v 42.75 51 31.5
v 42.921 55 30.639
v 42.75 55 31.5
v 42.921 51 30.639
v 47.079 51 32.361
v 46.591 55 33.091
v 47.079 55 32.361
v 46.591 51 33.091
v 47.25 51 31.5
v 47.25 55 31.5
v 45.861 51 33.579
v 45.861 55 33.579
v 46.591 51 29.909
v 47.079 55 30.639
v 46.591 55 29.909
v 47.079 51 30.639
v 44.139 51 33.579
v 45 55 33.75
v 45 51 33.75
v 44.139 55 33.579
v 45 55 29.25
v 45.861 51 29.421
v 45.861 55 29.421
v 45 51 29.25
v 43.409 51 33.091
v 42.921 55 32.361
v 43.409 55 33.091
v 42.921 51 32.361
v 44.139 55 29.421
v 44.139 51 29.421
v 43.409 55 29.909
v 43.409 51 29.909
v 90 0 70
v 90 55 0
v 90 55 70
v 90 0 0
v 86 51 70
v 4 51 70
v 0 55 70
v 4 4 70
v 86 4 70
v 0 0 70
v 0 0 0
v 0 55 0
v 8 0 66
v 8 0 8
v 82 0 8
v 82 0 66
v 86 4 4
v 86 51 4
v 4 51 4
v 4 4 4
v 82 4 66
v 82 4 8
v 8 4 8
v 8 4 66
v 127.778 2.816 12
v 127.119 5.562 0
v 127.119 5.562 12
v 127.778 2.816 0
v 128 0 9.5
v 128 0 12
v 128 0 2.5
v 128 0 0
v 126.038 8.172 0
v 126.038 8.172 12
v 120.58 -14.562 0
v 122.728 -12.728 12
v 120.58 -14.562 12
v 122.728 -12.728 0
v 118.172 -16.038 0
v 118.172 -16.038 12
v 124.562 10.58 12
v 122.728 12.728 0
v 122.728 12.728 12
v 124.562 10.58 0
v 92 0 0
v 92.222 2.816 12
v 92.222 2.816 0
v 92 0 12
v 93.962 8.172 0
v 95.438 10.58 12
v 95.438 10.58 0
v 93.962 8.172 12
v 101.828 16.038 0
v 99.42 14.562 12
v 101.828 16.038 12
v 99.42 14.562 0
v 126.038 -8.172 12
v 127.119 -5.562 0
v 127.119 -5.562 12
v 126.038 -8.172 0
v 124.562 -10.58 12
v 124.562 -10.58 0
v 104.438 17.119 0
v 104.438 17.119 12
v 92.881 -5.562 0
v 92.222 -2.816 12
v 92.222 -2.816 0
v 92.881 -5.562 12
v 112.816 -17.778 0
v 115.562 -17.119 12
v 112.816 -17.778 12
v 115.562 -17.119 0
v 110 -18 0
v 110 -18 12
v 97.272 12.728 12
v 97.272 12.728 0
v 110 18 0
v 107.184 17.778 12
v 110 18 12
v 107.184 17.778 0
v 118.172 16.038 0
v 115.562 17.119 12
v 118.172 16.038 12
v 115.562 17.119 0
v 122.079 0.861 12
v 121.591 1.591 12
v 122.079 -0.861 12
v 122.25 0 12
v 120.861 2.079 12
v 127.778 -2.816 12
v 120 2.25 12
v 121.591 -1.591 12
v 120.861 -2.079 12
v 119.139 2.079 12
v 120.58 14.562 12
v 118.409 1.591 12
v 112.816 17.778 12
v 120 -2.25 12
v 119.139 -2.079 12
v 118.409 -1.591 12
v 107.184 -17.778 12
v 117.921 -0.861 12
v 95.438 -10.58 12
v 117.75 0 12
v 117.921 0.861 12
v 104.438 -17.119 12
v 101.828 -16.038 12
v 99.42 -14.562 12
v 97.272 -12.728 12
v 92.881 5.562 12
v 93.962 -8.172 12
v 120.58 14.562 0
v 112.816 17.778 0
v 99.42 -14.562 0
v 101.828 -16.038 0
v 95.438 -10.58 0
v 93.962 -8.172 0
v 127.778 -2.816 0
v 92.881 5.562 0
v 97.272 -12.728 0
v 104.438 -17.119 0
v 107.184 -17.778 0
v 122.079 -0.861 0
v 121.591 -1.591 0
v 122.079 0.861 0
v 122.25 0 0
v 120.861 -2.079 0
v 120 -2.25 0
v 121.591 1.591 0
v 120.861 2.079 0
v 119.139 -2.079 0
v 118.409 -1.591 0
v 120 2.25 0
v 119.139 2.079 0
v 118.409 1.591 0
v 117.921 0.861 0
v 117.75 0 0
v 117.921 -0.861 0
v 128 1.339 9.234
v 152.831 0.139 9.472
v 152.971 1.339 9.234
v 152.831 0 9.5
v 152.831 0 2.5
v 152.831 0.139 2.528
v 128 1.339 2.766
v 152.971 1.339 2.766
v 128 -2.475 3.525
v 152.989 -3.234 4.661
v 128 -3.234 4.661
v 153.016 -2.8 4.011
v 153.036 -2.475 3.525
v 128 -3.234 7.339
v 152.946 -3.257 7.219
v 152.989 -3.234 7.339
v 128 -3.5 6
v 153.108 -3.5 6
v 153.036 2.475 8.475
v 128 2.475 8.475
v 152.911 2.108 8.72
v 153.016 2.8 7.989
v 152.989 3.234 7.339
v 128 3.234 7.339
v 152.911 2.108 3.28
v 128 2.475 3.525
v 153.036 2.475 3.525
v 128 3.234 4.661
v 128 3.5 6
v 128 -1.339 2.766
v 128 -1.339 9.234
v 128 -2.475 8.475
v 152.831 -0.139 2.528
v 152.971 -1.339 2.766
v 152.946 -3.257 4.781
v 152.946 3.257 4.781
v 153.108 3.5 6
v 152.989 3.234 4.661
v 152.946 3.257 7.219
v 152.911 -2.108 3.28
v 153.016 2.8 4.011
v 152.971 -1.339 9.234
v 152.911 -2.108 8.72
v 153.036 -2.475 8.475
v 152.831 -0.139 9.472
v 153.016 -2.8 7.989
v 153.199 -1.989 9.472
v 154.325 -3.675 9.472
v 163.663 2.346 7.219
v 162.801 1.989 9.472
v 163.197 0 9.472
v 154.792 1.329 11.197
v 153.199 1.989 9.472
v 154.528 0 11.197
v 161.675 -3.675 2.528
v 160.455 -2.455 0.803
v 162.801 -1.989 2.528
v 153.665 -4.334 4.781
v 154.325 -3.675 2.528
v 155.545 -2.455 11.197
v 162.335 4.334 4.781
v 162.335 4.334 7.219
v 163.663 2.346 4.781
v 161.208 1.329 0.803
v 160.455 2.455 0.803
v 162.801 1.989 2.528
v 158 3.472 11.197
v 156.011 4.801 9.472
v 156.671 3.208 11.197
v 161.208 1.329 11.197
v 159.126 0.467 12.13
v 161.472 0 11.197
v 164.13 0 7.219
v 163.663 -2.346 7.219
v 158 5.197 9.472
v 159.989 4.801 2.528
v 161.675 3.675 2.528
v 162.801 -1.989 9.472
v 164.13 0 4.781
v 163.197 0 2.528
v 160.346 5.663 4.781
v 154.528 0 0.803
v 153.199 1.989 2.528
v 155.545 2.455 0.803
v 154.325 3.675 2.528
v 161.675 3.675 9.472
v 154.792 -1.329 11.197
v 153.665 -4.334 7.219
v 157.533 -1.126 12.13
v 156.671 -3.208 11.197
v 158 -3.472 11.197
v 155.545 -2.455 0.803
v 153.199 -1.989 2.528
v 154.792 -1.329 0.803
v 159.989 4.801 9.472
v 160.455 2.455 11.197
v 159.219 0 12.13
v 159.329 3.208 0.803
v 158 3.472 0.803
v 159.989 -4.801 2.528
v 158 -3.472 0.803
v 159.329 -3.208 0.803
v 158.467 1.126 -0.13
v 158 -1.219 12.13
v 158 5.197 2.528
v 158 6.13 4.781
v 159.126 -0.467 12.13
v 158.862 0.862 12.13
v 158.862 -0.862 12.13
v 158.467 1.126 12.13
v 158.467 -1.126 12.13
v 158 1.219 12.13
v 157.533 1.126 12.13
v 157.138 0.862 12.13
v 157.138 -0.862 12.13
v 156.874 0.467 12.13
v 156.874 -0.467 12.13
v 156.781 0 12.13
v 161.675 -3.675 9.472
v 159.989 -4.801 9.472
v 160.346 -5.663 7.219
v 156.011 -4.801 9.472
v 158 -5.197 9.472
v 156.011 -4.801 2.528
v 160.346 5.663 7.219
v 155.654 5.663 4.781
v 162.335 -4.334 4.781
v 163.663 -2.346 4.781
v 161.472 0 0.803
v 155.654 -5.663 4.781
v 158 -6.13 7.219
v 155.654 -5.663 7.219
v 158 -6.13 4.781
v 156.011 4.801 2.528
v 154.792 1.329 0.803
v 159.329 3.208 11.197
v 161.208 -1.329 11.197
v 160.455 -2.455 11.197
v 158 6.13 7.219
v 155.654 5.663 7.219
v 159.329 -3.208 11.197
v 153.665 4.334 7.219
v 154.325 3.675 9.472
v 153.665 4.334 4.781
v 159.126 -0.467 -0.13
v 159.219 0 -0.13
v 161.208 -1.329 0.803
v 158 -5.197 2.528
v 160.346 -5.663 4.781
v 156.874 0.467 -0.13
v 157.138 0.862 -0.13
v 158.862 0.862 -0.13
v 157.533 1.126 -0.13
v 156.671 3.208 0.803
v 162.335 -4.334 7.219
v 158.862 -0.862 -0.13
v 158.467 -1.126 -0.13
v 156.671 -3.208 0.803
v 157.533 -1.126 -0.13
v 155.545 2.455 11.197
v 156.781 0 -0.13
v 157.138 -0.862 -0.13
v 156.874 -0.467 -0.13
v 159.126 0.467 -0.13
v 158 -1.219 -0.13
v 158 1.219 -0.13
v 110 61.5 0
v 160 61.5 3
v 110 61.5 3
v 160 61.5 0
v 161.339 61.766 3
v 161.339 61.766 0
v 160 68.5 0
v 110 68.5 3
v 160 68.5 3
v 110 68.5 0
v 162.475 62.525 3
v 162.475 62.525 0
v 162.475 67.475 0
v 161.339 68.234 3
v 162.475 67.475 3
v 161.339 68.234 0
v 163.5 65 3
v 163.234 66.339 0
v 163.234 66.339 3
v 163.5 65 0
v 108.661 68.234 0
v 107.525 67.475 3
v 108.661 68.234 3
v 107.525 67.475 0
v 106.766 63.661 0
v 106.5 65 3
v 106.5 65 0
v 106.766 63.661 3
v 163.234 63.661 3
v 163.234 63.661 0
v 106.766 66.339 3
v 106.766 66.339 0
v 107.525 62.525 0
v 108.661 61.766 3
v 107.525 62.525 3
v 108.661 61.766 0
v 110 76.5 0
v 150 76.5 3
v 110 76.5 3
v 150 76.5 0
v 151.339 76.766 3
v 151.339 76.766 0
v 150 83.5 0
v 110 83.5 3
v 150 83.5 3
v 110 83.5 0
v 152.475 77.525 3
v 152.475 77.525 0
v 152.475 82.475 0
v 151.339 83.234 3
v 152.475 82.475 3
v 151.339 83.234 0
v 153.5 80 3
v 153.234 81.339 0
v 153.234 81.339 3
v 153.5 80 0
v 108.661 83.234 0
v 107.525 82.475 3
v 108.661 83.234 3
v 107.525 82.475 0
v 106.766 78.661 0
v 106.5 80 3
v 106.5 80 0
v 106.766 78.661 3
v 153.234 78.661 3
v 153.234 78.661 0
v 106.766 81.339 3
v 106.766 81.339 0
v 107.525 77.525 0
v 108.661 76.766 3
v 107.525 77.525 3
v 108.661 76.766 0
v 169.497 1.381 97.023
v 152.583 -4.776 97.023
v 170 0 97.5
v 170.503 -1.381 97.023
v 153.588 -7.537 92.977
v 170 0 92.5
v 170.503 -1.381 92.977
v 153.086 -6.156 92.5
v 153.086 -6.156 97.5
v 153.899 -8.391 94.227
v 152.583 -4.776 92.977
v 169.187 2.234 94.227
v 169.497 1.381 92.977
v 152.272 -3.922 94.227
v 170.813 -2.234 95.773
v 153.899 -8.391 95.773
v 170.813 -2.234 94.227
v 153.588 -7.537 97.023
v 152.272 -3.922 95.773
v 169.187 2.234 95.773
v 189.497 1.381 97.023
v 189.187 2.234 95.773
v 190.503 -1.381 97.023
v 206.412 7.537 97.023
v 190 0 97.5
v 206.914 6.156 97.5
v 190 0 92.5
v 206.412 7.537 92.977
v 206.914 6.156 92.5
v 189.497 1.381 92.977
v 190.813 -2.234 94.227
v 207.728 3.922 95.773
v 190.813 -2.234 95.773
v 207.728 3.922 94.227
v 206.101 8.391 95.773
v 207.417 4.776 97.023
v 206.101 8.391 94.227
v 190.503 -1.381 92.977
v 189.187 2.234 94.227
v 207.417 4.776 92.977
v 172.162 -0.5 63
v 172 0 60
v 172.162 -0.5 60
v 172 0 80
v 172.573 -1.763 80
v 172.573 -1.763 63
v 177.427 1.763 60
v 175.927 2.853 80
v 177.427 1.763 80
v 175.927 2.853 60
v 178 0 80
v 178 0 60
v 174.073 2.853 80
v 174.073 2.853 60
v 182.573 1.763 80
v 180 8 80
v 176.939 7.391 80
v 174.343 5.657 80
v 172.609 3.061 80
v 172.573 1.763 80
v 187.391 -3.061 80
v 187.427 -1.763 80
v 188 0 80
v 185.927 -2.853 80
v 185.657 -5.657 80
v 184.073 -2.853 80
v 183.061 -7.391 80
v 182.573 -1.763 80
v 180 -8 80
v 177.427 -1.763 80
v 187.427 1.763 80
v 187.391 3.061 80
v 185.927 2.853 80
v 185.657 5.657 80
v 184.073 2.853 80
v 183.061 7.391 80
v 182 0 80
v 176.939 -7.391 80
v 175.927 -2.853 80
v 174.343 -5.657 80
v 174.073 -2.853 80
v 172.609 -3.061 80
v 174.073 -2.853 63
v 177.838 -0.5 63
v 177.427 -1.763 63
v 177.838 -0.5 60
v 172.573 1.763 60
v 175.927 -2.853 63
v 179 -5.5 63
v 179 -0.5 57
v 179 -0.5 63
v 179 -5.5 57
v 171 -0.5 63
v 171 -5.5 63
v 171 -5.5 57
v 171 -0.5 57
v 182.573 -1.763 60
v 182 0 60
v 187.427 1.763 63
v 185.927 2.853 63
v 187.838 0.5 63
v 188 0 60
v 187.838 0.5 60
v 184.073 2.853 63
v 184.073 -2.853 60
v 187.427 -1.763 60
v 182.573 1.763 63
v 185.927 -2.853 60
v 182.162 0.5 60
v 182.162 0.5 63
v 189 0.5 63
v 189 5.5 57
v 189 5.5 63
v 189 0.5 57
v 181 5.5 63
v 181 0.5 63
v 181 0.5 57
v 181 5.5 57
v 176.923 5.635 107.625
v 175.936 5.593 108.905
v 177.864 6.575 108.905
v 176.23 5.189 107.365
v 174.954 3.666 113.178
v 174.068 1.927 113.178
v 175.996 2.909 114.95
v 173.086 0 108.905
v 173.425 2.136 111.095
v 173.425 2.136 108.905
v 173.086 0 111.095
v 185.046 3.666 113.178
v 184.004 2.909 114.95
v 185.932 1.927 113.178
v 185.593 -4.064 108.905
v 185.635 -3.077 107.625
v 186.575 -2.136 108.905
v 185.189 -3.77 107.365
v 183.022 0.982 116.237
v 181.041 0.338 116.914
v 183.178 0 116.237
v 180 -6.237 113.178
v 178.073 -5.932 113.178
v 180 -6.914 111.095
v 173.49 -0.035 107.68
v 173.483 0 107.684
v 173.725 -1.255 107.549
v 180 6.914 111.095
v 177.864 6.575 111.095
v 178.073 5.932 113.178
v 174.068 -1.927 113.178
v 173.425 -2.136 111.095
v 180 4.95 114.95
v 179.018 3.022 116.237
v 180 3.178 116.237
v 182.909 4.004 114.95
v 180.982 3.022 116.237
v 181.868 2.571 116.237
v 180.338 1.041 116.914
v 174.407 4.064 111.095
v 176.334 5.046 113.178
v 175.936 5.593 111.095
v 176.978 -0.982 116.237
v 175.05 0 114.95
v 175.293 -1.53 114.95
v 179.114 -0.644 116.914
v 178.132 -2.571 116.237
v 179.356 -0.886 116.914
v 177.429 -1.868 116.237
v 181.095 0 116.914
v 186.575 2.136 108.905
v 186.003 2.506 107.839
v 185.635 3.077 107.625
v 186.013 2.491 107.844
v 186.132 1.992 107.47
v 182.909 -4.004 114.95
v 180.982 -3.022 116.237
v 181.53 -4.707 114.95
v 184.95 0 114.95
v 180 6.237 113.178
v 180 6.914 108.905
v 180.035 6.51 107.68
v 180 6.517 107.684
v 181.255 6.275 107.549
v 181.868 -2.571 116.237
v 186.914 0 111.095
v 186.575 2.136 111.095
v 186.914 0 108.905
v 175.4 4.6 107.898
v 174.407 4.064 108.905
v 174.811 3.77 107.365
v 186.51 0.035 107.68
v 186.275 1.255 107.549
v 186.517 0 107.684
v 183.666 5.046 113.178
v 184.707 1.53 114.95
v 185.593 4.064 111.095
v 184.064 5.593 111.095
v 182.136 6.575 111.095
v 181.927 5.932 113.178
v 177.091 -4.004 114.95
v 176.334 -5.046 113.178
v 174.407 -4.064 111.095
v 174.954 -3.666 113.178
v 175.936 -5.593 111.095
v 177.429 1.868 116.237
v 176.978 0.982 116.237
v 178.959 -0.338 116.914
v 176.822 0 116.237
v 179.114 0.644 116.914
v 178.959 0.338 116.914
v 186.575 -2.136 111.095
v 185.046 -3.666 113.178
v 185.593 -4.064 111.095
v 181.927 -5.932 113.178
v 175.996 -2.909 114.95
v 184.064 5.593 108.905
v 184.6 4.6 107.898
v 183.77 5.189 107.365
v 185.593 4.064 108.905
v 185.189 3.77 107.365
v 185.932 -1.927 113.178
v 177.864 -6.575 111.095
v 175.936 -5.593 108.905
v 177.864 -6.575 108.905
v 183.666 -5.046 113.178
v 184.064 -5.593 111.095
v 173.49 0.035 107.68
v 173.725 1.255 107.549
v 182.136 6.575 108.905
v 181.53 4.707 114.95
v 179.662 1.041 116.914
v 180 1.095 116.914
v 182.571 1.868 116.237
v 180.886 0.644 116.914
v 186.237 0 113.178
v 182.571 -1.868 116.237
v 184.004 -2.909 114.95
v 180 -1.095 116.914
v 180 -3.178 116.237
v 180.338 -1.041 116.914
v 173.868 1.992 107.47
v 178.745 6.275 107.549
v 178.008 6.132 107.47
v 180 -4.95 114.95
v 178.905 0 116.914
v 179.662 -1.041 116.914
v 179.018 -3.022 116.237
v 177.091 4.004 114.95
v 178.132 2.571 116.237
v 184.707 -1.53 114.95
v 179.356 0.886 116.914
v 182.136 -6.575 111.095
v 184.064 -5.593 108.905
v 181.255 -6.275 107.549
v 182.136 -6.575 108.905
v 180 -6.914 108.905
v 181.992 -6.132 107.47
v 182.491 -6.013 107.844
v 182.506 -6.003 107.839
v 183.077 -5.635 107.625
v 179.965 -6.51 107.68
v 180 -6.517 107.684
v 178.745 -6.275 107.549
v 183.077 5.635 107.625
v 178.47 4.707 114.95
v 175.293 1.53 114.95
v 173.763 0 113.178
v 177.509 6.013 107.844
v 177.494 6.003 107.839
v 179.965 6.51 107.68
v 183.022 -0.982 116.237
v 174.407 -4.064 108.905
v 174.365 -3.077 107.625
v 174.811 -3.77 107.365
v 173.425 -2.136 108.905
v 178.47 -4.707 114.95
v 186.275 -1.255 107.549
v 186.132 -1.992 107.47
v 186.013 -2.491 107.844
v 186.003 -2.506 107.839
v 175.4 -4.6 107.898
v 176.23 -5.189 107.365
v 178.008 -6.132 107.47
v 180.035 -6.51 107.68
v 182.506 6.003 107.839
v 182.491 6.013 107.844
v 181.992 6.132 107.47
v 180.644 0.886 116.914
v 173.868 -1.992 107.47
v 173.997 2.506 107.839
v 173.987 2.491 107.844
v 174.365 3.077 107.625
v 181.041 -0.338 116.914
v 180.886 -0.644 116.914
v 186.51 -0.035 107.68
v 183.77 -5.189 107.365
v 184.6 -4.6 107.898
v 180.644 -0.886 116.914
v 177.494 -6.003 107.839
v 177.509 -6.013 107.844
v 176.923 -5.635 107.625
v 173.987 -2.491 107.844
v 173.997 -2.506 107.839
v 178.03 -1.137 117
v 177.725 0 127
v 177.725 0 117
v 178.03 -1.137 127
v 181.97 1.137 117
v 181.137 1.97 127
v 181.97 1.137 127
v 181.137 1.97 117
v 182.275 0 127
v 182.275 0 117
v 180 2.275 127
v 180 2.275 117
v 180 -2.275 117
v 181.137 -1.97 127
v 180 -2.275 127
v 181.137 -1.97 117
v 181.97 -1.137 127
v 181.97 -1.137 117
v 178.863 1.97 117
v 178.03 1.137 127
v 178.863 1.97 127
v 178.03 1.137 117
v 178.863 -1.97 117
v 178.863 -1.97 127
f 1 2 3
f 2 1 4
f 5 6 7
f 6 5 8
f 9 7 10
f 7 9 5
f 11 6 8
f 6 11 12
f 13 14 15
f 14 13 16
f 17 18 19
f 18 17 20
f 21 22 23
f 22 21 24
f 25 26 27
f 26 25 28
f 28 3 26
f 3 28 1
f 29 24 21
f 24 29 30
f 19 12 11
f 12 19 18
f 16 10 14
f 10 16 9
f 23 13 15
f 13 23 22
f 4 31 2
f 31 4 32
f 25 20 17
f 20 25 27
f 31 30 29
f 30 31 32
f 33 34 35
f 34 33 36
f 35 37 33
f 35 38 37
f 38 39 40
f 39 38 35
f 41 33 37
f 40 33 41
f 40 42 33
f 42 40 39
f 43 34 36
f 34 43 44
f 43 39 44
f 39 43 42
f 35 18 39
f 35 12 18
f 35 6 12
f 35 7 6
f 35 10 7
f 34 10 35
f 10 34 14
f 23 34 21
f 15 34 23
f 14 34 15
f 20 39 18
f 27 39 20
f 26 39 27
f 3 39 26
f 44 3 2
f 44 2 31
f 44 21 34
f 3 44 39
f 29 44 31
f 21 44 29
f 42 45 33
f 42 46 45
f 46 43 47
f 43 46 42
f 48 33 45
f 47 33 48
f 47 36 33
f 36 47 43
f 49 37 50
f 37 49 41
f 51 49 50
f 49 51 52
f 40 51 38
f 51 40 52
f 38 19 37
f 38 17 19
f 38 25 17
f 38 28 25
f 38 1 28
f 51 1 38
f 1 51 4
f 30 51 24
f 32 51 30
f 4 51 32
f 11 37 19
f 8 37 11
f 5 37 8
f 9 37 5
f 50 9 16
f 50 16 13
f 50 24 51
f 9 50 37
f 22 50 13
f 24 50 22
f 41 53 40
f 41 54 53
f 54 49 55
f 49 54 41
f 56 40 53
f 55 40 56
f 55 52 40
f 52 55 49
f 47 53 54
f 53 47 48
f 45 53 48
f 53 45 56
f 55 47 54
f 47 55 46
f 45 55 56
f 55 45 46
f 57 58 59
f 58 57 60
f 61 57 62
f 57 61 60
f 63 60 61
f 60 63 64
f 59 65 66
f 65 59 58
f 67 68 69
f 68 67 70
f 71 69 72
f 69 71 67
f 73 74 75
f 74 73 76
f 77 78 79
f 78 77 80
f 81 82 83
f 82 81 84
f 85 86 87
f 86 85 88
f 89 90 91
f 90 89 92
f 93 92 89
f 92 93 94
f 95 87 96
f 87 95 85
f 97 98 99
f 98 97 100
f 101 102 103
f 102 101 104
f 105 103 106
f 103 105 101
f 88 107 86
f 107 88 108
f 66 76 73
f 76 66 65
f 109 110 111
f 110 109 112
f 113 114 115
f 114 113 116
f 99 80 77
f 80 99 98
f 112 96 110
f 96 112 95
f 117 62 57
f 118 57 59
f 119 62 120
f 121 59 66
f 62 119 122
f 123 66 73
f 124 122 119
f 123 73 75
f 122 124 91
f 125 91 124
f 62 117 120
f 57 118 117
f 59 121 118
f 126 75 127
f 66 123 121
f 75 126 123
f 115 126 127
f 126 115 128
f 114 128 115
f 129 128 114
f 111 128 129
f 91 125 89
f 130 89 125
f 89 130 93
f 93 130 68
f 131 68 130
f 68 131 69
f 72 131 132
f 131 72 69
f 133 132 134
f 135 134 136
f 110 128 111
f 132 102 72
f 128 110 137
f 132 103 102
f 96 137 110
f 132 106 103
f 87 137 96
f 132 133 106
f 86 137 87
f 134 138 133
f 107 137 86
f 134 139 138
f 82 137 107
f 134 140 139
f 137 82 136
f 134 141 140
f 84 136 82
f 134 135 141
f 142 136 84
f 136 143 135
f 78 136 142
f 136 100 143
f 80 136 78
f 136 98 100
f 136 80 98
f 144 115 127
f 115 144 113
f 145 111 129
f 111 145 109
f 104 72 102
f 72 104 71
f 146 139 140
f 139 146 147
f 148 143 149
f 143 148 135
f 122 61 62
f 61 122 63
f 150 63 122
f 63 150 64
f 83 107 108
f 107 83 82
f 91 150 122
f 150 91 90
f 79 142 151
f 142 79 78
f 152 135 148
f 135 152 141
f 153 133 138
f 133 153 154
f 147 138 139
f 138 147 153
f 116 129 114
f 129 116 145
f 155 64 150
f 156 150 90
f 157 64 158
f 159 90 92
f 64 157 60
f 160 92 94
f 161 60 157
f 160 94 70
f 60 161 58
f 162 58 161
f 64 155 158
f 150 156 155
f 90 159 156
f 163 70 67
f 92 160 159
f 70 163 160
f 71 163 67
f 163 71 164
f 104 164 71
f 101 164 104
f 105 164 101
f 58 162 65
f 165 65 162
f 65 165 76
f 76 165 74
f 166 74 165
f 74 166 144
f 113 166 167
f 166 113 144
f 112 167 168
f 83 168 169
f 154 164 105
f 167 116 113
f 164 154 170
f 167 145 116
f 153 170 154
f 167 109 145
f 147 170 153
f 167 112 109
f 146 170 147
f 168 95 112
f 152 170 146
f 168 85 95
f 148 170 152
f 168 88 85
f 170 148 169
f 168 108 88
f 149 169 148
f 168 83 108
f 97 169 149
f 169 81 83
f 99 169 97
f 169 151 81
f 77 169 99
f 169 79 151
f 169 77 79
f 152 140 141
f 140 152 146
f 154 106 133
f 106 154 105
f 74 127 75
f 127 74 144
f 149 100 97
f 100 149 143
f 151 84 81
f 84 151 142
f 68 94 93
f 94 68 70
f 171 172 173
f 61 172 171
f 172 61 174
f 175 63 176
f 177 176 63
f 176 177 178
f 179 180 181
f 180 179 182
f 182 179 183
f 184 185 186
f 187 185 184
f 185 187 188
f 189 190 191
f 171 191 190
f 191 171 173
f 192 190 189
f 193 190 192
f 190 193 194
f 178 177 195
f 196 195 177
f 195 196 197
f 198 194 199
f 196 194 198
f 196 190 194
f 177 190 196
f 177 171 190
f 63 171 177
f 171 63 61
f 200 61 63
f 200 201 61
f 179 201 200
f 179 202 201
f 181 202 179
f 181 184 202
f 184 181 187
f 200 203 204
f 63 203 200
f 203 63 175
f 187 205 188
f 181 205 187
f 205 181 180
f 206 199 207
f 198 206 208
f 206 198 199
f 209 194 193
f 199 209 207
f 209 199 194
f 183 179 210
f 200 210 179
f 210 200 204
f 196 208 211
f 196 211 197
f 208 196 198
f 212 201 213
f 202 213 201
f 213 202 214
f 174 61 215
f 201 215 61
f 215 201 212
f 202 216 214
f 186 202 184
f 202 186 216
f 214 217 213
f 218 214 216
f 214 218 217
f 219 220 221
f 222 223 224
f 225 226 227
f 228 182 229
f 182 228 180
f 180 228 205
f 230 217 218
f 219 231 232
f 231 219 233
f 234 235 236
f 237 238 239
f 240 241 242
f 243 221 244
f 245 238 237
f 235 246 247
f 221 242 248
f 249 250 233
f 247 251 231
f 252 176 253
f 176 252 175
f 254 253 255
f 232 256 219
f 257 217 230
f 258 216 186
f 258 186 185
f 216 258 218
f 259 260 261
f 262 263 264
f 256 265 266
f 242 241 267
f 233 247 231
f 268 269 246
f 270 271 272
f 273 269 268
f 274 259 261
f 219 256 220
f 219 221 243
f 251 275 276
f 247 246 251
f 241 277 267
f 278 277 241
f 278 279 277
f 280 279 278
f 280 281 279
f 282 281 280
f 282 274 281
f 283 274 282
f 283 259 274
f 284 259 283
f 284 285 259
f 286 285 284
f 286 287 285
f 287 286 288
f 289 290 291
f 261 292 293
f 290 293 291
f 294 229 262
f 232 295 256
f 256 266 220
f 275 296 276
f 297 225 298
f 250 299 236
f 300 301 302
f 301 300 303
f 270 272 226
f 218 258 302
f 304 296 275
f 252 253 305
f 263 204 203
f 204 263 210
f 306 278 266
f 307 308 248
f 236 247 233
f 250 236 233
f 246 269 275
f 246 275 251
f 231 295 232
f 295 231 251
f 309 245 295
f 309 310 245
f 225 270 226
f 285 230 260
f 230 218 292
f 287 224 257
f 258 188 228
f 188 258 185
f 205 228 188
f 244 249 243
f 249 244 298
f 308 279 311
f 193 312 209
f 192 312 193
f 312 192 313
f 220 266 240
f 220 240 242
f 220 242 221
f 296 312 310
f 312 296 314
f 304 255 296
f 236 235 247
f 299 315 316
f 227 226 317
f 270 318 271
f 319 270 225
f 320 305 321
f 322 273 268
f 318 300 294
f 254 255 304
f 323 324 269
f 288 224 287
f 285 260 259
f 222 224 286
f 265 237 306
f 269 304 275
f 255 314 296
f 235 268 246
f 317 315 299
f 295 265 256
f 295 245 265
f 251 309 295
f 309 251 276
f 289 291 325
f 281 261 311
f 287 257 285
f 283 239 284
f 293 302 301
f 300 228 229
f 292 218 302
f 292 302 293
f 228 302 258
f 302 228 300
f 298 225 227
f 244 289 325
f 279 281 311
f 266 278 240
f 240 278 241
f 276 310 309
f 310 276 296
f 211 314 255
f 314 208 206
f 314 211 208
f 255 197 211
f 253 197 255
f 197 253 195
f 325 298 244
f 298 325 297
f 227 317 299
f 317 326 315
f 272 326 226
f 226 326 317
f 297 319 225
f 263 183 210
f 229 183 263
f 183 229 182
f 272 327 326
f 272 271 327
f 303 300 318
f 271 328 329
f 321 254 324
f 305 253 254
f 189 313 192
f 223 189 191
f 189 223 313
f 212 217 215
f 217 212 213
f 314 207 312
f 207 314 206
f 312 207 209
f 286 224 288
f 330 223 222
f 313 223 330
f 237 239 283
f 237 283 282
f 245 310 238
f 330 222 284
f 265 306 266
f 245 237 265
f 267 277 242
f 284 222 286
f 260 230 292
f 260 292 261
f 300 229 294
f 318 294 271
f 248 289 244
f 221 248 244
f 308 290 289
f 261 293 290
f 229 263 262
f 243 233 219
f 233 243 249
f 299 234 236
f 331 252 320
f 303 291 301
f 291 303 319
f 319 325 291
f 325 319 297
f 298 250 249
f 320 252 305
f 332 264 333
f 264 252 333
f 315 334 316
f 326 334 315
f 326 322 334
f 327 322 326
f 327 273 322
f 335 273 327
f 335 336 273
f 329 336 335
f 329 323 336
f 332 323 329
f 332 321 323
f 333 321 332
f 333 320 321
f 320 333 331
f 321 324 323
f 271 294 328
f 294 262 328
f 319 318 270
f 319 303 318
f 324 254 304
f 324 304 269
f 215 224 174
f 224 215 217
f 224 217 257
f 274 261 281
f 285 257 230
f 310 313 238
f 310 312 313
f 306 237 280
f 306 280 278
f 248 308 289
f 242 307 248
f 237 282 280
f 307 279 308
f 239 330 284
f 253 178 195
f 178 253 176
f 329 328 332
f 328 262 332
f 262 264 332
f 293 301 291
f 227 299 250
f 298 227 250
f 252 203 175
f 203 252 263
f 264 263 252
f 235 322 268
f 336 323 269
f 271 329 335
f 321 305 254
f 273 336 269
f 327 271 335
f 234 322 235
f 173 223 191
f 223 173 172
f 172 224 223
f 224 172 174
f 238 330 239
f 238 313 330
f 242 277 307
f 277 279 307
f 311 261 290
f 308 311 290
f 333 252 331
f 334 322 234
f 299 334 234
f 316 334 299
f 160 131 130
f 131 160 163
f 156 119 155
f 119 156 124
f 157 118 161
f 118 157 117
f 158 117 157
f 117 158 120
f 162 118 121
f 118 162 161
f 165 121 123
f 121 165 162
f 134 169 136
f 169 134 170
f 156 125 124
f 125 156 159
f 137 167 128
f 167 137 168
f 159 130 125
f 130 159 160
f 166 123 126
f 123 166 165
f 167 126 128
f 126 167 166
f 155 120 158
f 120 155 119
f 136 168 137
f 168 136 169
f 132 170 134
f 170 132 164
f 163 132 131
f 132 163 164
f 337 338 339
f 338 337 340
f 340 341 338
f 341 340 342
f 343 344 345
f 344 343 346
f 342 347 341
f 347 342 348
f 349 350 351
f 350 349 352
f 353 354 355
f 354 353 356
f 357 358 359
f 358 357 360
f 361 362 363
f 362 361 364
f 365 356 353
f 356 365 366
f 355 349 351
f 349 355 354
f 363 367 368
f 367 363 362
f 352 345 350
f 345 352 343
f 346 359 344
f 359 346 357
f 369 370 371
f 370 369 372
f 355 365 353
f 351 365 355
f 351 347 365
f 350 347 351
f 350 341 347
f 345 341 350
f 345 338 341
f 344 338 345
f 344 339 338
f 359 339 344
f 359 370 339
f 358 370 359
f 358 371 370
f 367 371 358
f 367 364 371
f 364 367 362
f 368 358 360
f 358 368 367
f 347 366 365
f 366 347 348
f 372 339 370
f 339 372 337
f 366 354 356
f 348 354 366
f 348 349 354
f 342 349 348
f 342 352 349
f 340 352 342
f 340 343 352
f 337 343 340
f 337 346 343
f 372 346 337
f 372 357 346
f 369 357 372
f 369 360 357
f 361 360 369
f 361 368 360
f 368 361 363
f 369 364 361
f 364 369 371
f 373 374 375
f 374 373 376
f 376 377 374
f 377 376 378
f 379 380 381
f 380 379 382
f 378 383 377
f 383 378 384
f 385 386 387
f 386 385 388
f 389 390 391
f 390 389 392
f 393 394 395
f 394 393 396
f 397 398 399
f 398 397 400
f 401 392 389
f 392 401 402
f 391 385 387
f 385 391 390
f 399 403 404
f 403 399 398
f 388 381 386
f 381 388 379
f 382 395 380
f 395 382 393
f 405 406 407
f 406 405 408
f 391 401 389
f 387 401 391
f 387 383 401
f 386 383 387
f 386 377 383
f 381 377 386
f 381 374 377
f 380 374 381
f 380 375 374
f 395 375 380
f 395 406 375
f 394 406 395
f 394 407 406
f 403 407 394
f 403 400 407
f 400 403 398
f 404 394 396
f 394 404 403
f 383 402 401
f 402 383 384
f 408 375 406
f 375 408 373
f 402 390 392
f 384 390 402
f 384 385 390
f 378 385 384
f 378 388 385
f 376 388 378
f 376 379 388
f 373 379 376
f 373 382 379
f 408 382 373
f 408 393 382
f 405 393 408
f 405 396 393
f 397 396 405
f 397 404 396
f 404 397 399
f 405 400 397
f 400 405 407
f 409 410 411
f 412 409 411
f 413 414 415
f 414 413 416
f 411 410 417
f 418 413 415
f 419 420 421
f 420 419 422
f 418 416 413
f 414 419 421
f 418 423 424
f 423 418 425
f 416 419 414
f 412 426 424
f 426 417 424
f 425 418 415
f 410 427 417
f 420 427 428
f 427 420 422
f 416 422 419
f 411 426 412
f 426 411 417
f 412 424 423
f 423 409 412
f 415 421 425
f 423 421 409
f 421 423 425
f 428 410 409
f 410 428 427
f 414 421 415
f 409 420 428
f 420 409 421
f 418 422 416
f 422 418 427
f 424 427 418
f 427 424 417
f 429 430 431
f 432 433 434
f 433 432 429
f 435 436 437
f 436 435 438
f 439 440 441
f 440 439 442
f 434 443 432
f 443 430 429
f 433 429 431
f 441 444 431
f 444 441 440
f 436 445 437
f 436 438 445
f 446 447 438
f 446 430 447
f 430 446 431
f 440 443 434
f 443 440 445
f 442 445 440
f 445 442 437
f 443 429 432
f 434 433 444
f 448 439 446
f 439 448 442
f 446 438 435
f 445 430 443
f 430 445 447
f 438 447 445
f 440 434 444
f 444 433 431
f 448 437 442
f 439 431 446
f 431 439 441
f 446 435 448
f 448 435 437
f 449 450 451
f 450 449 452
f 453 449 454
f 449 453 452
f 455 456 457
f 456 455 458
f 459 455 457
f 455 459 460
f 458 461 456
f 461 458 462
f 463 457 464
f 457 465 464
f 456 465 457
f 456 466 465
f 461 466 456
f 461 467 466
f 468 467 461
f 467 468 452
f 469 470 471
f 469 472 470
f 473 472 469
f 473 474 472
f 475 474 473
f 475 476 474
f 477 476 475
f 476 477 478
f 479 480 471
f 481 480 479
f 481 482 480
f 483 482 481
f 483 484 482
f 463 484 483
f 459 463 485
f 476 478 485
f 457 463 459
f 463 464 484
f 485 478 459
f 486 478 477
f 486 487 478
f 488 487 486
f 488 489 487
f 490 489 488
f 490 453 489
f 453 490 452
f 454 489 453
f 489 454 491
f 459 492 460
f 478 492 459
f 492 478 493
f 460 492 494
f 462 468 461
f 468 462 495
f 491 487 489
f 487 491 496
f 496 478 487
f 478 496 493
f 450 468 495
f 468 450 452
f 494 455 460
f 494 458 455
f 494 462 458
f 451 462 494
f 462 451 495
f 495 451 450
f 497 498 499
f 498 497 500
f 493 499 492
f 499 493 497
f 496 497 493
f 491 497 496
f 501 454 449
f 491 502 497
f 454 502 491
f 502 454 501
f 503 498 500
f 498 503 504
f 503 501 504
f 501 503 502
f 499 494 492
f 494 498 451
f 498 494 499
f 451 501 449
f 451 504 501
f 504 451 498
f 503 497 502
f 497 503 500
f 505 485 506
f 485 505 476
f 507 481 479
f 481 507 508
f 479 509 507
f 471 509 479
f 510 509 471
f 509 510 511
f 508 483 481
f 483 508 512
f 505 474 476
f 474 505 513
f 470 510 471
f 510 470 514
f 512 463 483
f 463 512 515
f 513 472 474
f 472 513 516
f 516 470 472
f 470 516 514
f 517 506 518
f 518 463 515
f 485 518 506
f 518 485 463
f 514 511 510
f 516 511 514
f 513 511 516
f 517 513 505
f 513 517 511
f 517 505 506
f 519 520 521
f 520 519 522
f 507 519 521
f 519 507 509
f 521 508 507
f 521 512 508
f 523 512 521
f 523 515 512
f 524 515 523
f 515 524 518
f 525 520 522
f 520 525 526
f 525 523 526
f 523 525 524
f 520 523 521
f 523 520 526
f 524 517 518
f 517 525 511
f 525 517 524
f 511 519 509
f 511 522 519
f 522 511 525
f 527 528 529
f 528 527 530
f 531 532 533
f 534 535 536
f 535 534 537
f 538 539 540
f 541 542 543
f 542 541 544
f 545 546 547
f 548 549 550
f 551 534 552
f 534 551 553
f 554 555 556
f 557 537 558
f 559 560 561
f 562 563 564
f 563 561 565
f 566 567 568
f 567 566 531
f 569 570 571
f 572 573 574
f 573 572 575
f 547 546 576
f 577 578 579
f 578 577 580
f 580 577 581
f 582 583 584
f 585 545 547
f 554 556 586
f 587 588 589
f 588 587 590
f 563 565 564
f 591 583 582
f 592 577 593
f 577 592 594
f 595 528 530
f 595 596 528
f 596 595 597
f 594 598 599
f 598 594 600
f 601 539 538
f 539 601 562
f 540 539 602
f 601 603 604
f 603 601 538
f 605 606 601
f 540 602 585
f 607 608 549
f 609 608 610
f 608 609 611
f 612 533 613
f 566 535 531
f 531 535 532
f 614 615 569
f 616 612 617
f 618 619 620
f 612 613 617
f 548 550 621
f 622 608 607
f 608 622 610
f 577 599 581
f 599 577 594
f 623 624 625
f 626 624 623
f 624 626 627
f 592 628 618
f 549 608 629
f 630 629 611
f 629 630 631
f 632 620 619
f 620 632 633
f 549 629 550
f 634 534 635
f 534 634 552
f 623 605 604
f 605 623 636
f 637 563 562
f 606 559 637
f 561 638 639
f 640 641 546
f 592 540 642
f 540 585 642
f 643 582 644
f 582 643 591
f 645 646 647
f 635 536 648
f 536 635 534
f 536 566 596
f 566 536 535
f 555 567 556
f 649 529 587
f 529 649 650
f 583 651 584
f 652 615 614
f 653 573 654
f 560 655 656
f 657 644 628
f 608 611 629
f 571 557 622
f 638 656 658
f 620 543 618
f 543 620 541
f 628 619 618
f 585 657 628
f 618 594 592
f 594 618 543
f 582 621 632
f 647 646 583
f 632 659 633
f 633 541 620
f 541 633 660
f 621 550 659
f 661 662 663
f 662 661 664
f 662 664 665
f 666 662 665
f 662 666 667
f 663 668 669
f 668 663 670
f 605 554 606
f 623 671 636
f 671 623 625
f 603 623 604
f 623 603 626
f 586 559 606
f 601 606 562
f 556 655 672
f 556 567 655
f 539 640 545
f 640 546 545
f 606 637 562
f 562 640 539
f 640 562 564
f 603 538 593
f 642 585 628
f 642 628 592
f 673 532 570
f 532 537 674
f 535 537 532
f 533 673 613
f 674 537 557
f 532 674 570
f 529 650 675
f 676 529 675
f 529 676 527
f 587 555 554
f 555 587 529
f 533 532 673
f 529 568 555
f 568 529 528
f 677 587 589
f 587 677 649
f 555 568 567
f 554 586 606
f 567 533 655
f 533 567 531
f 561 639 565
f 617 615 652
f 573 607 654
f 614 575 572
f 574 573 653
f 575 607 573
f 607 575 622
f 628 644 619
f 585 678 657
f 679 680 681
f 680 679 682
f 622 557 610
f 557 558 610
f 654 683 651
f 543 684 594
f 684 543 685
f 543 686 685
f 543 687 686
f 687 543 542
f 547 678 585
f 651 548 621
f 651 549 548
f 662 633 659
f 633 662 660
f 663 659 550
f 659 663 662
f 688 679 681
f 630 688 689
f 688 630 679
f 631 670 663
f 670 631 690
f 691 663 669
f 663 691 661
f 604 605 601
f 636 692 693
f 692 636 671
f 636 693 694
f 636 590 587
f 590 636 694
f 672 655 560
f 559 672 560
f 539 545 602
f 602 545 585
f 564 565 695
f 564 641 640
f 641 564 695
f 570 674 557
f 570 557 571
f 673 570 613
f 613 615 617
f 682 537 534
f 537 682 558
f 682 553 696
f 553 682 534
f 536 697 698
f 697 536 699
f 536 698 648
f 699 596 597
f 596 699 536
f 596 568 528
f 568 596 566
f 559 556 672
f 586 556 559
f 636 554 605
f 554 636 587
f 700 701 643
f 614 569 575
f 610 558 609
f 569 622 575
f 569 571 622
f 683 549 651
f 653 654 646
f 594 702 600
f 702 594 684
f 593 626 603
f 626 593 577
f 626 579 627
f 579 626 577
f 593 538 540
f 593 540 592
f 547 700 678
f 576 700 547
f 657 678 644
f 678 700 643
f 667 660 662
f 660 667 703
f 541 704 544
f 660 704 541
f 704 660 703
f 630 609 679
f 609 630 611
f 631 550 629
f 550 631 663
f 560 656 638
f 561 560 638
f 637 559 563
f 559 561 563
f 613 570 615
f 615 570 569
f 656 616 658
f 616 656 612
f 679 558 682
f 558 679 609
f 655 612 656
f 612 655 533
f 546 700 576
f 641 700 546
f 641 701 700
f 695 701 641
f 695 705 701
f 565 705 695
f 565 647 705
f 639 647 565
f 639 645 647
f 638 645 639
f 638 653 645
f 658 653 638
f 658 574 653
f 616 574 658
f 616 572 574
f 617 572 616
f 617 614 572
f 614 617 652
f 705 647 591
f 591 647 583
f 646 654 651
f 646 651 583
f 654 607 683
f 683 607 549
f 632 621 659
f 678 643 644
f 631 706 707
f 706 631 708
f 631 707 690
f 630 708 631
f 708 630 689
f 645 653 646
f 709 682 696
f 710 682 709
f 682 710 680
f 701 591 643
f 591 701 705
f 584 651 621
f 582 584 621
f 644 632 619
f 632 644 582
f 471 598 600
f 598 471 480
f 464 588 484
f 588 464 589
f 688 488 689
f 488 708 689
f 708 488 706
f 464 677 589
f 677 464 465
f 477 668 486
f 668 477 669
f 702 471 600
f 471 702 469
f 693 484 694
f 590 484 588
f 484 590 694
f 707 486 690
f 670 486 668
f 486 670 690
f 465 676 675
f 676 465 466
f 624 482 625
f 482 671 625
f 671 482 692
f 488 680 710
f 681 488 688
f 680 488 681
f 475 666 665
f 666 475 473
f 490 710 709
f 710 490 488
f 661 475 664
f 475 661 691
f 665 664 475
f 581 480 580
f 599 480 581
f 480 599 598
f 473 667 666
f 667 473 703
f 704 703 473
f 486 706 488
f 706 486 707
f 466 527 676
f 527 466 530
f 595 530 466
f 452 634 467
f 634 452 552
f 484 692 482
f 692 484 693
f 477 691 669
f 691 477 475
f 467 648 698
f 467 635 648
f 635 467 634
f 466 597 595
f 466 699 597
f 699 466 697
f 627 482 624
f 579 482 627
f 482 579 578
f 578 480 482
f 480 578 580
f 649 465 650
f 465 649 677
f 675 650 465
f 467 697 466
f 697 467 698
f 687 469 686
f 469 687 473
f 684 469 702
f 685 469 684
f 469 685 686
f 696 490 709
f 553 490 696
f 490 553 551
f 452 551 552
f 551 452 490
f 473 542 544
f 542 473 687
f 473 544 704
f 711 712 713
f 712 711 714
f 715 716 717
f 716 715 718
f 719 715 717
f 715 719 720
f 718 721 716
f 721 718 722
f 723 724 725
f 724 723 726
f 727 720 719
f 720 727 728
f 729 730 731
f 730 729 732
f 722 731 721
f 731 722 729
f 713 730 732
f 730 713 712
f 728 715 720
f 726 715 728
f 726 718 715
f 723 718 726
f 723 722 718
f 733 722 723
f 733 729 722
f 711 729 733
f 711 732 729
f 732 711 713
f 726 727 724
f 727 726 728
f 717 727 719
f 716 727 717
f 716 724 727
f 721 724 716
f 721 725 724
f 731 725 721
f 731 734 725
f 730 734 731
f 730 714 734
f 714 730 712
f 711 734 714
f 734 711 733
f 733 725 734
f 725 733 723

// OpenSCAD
// Crank Automata — Walking Figure (Box Cam Mechanism)
// Turn the crank → figure walks via eccentric cam + connecting rods
// PLA — 0.2mm, 4 walls, 20% infill
// Hardware: 2x M4x40 bolts (axle), 2x M3x20 (leg pivots)
// DUAL COLOR: box + cam (dark PLA) + figure + rods (contrast)

BOX_W  = 90;
BOX_D  = 55;
BOX_H  = 70;
WALL   = 4.0;
AXLE_D = 4.5;    // M4 axle hole
CAM_D  = 36;
CAM_OFFSET = 10; // Eccentricity
CAM_T  = 12;
ROD_D  = 5.0;
CLEAR  = 0.45;
CRANK_L = 30;

// ── Box enclosure (Color 1) ───────────────────────────
module box() {
    difference() {
        cube([BOX_W, BOX_D, BOX_H]);
        // Hollow interior
        translate([WALL, WALL, WALL])
            cube([BOX_W - WALL*2, BOX_D - WALL*2, BOX_H]);
        // Axle holes (centered, sides)
        for (y = [-1, BOX_D + 1])
            translate([BOX_W/2, y, BOX_H * 0.45])
                rotate([90, 0, 0])
                    cylinder(d = AXLE_D, h = BOX_D + 2, $fn = 16);
        // Rod slot (top — figure exits here)
        translate([BOX_W/2 - 8, BOX_D/2 - 6, BOX_H - 0.1])
            cube([16, 12, WALL + 1]);
        // Front viewing window
        translate([WALL * 2, -0.1, WALL * 2])
            cube([BOX_W - WALL*4, WALL + 1, BOX_H - WALL*3]);
    }
}

// ── Eccentric cam (Color 2) ───────────────────────────
module cam() {
    difference() {
        union() {
            // Cam disk
            cylinder(d = CAM_D, h = CAM_T, $fn = 40);
            // Crank arm
            translate([CAM_D/2, 0, CAM_T/2])
                rotate([0, 90, 0])
                    cylinder(d = ROD_D + 2, h = CRANK_L, $fn = 16);
            // Crank handle knob
            translate([CAM_D/2 + CRANK_L, 0, CAM_T/2])
                sphere(d = ROD_D * 2.5, $fn = 16);
        }
        // Axle bore (offset = eccentricity)
        translate([CAM_OFFSET, 0, -1])
            cylinder(d = AXLE_D, h = CAM_T + 2, $fn = 16);
    }
}

// ── Connecting rod ────────────────────────────────────
module connecting_rod(length) {
    hull() {
        cylinder(d = ROD_D + 2, h = WALL - 1, $fn = 16);
        translate([length, 0, 0])
            cylinder(d = ROD_D + 2, h = WALL - 1, $fn = 16);
    }
    // Pin holes
    cylinder(d = ROD_D - CLEAR, h = WALL - 1, $fn = 16);
    translate([length, 0, 0])
        cylinder(d = ROD_D - CLEAR, h = WALL - 1, $fn = 16);
}

// ── Walking figure torso ──────────────────────────────
module figure() {
    // Head
    translate([0, 0, 50]) sphere(d = 14, $fn = 20);
    // Body
    translate([0, 0, 20]) cylinder(d1 = 16, d2 = 13, h = 28, $fn = 16);
    // Arms (spread for balance)
    for (sx = [-1, 1])
        translate([sx * 10, 0, 35]) rotate([0, 90 * sx, 20])
            cylinder(d = 5, h = 18, $fn = 10);
    // Legs (articulated via rods)
    for (sx = [-1, 1])
        translate([sx * 5, 0, 0]) {
            cylinder(d = 6, h = 20, $fn = 10);
            // Foot
            translate([0, sx * 3, 0])
                cube([8, 5, 6], center = true);
        }
    // Rod attachment boss (top of head)
    translate([0, 0, 57])
        cylinder(d = ROD_D - CLEAR, h = 10, $fn = 12);
}

// ── Print layout ─────────────────────────────────────
// Color 1
box();
// Color 2 (print separately, assembled with rods)
translate([BOX_W + 20, 0, 0]) {
    cam();
    translate([0, BOX_D + 10, 0]) connecting_rod(50);
    translate([0, BOX_D + 25, 0]) connecting_rod(40);
}
// Figure (Color 2)
translate([BOX_W + 90, 0, 60]) figure();
